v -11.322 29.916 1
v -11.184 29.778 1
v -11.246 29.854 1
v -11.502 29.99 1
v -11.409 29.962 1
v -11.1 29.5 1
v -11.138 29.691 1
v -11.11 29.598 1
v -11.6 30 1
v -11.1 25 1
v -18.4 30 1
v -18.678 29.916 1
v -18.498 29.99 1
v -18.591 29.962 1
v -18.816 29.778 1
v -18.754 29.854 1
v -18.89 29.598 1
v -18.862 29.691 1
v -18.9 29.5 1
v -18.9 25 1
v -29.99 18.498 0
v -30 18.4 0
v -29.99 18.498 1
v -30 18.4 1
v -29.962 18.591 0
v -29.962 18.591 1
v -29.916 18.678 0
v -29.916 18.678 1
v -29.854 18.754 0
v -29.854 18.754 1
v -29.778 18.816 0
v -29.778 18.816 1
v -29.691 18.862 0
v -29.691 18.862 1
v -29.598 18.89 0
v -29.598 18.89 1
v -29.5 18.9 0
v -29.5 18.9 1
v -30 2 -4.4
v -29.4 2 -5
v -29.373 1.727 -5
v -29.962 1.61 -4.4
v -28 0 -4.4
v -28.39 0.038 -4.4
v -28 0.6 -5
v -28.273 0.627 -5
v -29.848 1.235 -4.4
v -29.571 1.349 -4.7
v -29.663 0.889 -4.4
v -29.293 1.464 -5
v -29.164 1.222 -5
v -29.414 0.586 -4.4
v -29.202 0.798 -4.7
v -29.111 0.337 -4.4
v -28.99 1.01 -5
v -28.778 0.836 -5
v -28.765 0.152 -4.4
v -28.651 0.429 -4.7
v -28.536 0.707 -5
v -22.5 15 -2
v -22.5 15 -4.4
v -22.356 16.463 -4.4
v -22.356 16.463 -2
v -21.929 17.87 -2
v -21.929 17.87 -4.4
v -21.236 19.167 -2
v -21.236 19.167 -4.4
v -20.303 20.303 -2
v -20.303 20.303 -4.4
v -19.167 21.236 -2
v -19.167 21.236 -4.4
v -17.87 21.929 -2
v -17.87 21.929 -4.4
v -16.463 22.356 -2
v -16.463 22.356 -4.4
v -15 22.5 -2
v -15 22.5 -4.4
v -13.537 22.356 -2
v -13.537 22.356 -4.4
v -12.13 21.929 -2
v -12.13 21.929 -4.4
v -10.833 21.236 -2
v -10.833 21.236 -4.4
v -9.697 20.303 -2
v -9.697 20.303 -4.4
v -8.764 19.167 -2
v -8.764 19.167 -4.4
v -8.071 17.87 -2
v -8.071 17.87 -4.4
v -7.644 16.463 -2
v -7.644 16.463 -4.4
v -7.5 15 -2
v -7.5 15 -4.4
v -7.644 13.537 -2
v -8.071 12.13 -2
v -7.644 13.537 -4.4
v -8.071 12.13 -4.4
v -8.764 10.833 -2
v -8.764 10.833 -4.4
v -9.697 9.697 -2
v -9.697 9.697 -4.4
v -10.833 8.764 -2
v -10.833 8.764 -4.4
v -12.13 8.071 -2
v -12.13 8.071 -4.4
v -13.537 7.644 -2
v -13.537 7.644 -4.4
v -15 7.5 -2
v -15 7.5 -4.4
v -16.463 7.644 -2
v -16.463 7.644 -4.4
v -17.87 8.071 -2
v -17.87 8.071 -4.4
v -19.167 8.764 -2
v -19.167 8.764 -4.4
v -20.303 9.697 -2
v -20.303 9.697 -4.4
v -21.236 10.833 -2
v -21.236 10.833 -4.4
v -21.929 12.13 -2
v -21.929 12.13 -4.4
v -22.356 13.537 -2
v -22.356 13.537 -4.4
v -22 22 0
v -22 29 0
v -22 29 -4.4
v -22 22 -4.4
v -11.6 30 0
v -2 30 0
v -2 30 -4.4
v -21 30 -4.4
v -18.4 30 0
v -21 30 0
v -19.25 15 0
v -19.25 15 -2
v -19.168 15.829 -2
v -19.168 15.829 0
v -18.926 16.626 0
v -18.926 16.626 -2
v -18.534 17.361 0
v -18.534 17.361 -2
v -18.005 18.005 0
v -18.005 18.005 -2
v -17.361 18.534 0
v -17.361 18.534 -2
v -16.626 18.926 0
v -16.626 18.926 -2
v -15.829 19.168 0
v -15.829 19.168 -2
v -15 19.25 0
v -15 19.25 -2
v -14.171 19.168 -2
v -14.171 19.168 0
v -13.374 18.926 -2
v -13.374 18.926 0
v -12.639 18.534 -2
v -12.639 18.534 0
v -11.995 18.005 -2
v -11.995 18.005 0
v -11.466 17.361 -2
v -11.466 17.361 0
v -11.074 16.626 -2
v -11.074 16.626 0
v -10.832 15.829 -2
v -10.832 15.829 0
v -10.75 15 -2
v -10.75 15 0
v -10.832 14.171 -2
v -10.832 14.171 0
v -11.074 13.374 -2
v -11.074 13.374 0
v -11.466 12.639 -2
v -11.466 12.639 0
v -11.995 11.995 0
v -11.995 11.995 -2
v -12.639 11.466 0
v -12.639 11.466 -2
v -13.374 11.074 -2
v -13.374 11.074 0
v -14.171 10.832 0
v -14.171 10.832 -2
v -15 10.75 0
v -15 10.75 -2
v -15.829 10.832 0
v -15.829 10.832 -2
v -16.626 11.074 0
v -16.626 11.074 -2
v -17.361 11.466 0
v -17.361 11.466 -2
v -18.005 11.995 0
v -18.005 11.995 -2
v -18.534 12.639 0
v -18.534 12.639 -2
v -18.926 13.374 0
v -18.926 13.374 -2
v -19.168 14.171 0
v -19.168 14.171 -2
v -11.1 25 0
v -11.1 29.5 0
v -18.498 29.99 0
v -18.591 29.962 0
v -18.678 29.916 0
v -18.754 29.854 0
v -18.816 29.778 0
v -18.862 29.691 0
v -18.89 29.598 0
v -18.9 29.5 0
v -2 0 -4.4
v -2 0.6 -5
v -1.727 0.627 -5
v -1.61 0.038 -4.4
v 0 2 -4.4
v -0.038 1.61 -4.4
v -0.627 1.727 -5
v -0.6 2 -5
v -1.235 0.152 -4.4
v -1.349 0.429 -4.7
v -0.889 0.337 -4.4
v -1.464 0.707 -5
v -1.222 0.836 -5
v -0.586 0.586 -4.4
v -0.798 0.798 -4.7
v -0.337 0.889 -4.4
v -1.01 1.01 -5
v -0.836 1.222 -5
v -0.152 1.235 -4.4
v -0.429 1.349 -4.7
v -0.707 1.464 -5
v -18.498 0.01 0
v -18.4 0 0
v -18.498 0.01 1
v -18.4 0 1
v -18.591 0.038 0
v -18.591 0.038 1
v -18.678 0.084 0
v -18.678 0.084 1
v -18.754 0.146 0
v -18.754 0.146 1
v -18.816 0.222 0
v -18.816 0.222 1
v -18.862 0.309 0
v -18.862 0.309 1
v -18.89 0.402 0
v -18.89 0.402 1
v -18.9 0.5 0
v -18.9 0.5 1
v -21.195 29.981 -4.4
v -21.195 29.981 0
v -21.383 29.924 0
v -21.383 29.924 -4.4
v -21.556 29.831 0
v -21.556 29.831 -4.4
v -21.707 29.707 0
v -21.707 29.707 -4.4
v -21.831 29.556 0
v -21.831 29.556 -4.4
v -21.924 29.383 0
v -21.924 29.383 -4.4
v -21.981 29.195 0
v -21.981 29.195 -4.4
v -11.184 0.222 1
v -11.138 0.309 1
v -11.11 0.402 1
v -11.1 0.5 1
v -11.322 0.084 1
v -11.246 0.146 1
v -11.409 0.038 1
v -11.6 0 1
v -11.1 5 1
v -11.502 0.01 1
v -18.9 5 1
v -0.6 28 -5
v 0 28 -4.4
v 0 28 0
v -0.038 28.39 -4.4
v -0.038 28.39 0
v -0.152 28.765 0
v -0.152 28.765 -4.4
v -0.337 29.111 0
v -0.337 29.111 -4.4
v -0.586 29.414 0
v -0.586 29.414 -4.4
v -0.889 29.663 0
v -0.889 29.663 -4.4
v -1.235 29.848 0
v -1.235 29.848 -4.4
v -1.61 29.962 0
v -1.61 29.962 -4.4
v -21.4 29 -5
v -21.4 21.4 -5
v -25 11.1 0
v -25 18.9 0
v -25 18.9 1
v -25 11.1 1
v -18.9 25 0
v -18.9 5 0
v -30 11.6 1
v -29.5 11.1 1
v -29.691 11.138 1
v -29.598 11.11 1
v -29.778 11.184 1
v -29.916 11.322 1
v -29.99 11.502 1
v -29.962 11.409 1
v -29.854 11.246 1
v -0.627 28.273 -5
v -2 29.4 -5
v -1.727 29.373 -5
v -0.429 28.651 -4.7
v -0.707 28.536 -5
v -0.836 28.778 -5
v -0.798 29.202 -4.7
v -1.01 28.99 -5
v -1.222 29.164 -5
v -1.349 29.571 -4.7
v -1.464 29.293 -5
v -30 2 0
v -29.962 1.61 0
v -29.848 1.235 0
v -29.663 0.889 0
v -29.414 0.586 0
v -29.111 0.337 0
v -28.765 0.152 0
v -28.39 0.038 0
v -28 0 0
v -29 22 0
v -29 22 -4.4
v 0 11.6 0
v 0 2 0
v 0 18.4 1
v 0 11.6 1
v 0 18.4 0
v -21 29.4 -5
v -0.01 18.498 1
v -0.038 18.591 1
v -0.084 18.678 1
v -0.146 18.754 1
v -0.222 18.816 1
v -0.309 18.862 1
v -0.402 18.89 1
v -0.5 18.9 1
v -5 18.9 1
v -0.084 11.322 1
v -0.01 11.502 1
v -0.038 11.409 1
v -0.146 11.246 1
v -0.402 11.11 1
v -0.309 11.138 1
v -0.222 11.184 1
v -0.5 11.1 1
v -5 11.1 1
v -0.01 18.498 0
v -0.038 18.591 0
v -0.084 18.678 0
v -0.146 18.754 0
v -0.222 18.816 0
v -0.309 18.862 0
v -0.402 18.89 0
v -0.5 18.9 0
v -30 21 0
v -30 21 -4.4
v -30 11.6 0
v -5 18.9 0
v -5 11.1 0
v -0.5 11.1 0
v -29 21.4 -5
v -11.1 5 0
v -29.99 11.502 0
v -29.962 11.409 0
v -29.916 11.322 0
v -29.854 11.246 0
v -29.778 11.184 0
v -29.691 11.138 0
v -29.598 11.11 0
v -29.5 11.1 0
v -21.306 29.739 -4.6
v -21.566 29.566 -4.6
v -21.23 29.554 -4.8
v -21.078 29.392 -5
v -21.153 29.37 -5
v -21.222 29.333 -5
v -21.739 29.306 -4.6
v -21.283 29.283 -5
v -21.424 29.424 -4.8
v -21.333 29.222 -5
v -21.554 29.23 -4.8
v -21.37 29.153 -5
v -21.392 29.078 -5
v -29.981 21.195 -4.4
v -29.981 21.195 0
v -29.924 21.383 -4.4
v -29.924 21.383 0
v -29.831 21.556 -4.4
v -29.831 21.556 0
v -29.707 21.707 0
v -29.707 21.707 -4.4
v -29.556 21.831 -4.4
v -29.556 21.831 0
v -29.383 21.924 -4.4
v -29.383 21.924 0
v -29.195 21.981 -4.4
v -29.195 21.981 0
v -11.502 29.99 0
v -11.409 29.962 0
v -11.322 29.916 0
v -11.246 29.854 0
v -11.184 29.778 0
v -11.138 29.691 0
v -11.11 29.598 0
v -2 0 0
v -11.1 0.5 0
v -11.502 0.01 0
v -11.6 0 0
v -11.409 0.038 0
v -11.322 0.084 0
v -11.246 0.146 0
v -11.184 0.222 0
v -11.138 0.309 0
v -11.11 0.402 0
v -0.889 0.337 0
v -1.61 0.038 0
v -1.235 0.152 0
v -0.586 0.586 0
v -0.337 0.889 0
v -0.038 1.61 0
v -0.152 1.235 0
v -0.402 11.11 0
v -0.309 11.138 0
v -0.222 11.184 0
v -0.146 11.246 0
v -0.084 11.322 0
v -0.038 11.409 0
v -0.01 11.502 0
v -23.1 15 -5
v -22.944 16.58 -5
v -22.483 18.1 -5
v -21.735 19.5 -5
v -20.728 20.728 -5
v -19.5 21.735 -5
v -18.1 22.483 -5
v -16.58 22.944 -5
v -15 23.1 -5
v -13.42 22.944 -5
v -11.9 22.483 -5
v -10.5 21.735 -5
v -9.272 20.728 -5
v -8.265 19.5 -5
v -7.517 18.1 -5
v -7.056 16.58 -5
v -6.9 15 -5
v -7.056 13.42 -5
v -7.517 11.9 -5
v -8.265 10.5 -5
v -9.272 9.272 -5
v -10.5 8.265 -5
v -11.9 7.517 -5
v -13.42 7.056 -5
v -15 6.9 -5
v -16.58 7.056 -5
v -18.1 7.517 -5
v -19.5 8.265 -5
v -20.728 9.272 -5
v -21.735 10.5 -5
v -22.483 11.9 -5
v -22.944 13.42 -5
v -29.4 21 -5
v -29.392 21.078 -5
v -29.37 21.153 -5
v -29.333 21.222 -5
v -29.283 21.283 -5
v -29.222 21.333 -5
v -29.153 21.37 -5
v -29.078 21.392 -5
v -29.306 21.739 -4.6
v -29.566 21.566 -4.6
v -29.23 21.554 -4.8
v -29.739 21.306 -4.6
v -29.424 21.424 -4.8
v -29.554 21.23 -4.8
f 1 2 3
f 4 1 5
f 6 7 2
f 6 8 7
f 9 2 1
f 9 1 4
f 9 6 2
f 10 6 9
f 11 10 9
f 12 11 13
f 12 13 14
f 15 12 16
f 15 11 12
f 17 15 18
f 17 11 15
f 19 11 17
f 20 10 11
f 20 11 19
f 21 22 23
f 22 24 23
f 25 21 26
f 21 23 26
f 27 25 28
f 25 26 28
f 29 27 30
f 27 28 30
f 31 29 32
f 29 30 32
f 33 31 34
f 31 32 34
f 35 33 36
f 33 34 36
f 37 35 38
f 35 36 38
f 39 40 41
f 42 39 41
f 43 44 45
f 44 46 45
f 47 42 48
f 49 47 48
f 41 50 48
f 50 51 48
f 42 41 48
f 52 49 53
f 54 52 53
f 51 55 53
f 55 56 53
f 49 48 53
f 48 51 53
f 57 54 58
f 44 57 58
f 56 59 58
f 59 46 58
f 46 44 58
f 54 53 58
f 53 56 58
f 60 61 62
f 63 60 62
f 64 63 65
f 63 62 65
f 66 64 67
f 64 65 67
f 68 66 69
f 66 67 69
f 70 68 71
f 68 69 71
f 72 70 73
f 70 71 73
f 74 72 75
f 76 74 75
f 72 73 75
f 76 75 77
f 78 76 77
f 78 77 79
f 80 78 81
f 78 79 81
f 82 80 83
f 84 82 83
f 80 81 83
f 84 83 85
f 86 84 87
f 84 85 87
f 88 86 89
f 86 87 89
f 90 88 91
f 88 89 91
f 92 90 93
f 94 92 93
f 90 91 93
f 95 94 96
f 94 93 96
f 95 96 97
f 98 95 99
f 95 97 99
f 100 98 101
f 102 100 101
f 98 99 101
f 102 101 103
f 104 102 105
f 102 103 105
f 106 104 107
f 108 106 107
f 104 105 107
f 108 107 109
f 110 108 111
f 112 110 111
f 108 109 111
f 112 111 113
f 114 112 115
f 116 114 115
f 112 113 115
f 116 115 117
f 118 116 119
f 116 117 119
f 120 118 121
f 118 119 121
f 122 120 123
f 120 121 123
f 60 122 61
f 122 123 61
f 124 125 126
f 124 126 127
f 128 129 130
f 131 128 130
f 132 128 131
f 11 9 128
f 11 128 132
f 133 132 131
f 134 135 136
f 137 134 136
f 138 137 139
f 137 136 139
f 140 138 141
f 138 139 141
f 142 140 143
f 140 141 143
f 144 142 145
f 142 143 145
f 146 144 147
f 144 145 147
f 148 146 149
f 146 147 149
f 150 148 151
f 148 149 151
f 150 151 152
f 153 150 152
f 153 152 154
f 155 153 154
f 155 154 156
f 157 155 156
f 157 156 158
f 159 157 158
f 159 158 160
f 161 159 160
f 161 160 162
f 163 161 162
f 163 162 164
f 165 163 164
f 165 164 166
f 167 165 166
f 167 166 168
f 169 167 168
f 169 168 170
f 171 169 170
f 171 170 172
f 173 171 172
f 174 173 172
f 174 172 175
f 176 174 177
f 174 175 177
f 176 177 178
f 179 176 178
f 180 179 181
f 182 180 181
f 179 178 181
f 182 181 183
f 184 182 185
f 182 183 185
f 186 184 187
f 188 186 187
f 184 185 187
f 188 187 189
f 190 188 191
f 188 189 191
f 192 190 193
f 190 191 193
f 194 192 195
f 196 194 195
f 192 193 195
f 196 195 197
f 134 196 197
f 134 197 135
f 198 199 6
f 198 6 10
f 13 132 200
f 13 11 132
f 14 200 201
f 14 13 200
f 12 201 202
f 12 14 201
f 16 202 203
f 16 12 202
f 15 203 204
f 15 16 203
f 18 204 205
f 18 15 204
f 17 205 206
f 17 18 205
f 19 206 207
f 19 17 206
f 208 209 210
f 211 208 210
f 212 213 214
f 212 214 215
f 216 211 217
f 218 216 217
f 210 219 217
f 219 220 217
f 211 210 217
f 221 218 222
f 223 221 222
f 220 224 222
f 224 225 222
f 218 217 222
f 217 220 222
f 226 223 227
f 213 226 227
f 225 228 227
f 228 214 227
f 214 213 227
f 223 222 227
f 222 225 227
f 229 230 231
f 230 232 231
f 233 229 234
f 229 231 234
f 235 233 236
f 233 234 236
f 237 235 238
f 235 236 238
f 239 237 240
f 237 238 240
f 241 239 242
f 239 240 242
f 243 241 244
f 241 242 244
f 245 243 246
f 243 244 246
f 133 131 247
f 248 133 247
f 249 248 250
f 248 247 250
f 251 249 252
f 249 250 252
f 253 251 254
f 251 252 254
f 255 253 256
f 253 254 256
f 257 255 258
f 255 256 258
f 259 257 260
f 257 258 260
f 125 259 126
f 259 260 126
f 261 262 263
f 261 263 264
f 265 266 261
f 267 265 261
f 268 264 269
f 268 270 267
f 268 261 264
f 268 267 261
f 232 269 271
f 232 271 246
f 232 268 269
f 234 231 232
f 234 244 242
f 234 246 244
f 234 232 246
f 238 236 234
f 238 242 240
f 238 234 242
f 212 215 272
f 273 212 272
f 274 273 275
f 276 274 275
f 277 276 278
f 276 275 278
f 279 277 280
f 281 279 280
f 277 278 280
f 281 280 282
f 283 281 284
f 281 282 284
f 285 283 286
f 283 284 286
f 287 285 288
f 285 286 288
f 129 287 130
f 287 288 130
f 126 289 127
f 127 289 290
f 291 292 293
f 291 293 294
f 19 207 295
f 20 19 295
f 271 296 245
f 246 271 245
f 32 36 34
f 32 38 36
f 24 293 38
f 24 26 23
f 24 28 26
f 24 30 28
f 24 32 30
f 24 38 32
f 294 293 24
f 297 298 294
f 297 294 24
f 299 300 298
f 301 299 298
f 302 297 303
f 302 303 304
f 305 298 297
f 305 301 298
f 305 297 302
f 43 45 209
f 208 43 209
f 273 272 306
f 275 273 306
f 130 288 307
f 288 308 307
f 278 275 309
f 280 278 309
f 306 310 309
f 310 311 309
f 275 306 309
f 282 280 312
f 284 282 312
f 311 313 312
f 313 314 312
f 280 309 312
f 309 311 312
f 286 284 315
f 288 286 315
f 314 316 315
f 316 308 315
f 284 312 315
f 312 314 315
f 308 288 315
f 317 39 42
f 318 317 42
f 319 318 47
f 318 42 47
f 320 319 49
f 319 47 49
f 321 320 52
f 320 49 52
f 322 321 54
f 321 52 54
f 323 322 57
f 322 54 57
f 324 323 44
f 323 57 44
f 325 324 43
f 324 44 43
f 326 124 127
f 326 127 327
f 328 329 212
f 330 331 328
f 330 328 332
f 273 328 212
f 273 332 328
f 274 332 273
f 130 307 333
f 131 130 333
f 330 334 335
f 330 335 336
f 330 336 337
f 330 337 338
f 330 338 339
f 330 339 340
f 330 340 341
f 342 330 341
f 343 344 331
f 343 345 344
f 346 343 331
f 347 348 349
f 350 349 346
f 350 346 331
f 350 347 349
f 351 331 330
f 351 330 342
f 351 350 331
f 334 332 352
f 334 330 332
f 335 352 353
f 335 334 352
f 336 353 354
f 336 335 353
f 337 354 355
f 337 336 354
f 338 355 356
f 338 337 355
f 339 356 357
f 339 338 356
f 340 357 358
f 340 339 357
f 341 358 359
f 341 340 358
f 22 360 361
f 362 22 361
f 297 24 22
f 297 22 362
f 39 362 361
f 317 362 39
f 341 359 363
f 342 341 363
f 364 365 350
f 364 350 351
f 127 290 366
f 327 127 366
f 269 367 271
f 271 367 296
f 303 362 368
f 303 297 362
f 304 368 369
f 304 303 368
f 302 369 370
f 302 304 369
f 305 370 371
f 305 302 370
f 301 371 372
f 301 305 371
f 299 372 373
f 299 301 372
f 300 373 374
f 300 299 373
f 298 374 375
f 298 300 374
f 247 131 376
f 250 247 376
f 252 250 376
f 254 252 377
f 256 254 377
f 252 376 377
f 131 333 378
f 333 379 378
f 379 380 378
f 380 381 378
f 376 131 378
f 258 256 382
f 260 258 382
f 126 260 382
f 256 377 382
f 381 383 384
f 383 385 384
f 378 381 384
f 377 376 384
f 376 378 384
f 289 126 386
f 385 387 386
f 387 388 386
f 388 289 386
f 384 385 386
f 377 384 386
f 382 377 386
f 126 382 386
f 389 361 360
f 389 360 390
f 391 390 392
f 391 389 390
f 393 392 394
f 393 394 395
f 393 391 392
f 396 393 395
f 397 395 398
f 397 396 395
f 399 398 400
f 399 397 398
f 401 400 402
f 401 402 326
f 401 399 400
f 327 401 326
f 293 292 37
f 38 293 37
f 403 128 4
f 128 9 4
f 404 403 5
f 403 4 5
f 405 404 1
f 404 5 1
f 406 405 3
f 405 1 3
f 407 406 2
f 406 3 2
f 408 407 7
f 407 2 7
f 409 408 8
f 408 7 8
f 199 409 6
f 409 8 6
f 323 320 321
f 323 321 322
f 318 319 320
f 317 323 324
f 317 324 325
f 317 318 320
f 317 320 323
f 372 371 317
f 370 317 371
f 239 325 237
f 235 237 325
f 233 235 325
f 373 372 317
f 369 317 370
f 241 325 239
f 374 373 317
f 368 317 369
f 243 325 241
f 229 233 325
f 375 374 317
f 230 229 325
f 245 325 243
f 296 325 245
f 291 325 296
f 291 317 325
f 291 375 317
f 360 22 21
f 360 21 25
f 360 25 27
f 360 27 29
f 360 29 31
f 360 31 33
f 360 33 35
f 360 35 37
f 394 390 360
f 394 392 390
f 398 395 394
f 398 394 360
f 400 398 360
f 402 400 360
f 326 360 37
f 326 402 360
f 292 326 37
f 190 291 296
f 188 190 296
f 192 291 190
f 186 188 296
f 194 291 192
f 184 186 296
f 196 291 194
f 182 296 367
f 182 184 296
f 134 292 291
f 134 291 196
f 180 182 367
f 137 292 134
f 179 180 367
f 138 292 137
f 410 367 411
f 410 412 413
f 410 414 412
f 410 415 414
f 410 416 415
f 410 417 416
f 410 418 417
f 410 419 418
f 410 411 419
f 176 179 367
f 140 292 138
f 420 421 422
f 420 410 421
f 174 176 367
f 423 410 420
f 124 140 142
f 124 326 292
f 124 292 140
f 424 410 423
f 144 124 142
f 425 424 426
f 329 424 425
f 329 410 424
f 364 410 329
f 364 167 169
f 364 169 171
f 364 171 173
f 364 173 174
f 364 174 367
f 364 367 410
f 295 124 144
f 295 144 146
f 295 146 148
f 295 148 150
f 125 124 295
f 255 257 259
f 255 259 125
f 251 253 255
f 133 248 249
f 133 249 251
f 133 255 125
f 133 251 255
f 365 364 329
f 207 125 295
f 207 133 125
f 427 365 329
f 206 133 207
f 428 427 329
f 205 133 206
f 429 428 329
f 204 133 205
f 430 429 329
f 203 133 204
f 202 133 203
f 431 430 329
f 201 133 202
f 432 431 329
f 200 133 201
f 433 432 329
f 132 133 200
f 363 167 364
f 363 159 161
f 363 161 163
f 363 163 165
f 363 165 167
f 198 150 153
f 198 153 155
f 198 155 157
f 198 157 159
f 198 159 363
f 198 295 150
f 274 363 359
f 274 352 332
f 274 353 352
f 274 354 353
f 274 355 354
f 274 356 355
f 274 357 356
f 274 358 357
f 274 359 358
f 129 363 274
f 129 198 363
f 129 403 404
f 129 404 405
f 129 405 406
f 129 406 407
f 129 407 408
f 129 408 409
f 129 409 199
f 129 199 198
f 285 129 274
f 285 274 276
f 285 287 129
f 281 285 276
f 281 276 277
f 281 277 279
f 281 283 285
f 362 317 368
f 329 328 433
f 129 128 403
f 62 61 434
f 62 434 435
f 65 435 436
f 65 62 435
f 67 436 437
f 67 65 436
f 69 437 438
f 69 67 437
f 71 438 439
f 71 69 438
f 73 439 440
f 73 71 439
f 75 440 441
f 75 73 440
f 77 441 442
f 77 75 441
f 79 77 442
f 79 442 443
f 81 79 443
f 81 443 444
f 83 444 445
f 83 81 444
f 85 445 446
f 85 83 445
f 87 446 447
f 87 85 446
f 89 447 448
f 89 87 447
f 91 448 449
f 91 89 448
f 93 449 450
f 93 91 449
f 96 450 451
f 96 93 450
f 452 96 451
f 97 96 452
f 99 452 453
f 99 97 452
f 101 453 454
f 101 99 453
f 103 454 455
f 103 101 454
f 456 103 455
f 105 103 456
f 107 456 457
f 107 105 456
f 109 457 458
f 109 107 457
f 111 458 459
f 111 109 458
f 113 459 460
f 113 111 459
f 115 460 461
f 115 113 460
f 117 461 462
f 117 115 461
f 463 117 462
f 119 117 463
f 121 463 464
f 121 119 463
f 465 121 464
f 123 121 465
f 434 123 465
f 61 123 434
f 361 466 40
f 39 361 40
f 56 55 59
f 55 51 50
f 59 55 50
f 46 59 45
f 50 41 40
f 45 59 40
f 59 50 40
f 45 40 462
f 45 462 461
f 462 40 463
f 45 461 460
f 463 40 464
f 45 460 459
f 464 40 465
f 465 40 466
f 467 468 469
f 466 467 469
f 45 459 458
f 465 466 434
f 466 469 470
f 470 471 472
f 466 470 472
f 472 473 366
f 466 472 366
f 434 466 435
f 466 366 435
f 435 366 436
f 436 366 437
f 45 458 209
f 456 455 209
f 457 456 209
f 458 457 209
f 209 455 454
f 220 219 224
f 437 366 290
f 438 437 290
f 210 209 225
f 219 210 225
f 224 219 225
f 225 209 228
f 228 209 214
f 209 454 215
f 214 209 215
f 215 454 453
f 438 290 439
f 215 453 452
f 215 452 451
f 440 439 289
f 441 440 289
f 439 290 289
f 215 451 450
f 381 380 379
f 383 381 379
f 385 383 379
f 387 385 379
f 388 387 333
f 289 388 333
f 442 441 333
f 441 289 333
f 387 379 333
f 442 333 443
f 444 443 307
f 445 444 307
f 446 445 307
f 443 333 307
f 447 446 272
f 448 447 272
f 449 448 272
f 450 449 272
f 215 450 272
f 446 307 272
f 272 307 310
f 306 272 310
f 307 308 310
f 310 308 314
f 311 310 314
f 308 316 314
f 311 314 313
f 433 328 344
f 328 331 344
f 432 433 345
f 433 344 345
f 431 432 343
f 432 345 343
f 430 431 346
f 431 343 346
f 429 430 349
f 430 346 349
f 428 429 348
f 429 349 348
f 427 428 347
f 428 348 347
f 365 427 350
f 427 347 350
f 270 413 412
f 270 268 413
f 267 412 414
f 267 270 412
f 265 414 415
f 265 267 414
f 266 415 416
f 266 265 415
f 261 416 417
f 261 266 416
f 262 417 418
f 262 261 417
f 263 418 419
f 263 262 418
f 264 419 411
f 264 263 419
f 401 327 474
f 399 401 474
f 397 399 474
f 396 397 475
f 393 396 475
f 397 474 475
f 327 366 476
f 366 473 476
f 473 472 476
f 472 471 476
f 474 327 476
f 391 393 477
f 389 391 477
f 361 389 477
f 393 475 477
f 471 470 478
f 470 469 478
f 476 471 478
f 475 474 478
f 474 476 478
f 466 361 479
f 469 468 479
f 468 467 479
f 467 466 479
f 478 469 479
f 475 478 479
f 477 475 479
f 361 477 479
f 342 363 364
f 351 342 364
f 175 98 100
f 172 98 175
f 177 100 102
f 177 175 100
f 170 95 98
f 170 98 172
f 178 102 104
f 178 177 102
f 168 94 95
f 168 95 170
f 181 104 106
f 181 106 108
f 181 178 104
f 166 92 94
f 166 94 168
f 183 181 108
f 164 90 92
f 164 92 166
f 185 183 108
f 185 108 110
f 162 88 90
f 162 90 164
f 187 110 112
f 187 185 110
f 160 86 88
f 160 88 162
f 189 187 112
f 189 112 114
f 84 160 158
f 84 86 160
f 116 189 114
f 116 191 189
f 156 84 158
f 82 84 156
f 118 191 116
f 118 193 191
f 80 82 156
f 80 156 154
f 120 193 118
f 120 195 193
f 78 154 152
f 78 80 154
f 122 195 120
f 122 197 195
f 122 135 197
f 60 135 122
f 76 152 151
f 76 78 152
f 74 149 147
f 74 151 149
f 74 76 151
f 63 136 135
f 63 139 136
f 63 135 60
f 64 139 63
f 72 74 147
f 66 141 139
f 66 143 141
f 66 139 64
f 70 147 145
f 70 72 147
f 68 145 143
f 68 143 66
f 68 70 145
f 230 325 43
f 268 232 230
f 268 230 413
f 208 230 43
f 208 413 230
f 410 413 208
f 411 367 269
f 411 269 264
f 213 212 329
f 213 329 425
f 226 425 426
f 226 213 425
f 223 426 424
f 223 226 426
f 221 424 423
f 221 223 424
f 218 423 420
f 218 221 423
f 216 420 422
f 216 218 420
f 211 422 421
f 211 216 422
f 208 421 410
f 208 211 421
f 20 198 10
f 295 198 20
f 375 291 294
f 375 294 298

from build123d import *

# Parameters (mm, degrees)
PAD_DEPTH            = 5
SKETCH001_R          = 4.25
POCKET_DEPTH         = 5.001
SKETCH002_R          = 7.5
POCKET001_DEPTH      = 3
SKETCH003_W          = 7.8
SKETCH003_H          = 5
SKETCH003_W_2        = 5
SKETCH003_H_2        = 7.8
PAD001_DEPTH         = 1
FILLET_R             = 0.5
FILLET001_R          = 2
FILLET002_R          = 1
CHAMFER_SIZE         = 0.6
BODY_PLACEMENT_ANGLE = 180


with BuildPart() as part:
    # Sketch → Pad (new body)
    with BuildSketch(Plane.XY):
        Polygon((0, 0), (0, 30), (22, 30), (22, 22), (30, 22), (30, 0), align=None)
    extrude(amount=PAD_DEPTH)

    # Sketch001 (on Face8 of Pad) → Pocket (cut, through all)
    with BuildSketch(Plane.XY.offset(5)):
        with Locations((15, 15)):
            Circle(SKETCH001_R)
    extrude(amount=-POCKET_DEPTH, mode=Mode.SUBTRACT)

    # Sketch002 (on Face5 of Pocket) → Pocket001 (cut)
    with BuildSketch(Plane.XY.offset(5)):
        with Locations((15, 15)):
            Circle(SKETCH002_R)
    extrude(amount=-POCKET001_DEPTH, mode=Mode.SUBTRACT)

    # Sketch003 (on Face4 of Pocket001) → Pad001 (join)
    with BuildSketch(Plane(origin=(0, 0, 0), x_dir=(1, 0, 0), z_dir=(0, 0, -1))):
        with Locations((15, -2.5)):
            Rectangle(SKETCH003_W, SKETCH003_H)
        with Locations((15, -27.5)):
            Rectangle(SKETCH003_W, SKETCH003_H)
        with Locations((2.5, -15)):
            Rectangle(SKETCH003_W_2, SKETCH003_H_2)
        with Locations((27.5, -15)):
            Rectangle(SKETCH003_W_2, SKETCH003_H_2)
    extrude(amount=PAD001_DEPTH)

    # Fillet
    fillet_edges = [part.edges().sort_by_distance(p)[0] for p in [
        (18.9, 0, -0.5),
        (11.1, 0, -0.5),
        (0, 11.1, -0.5),
        (0, 18.9, -0.5),
        (11.1, 30, -0.5),
        (18.9, 30, -0.5),
        (30, 18.9, -0.5),
        (30, 11.1, -0.5),
    ]]
    fillet(fillet_edges, radius=FILLET_R)

    # Fillet001
    fillet001_edges = [part.edges().sort_by_distance(p)[0] for p in [
        (0, 30, 2.5),
        (0, 0, 2.5),
        (30, 0, 2.5),
    ]]
    fillet(fillet001_edges, radius=FILLET001_R)

    # Fillet002
    fillet002_edges = [part.edges().sort_by_distance(p)[0] for p in [
        (22, 30, 2.5),
        (30, 22, 2.5),
    ]]
    fillet(fillet002_edges, radius=FILLET002_R)

    # Chamfer
    chamfer_edges = [part.edges().sort_by_distance(p)[0] for p in [
        (11.5, 30, 5),
        (21.707107, 29.707107, 5),
        (0.585786, 29.414214, 5),
        (22, 25.5, 5),
        (0, 15, 5),
        (25.5, 22, 5),
        (0.585786, 0.585786, 5),
        (29.707107, 21.707107, 5),
        (15, 0, 5),
        (30, 11.5, 5),
        (29.414214, 0.585786, 5),
        (7.5, 15, 5),
    ]]
    chamfer(chamfer_edges, length=CHAMFER_SIZE)


with BuildPart() as part_1:
    # Body placement: moved
    add(part.part.rotate(Axis((0, 0, 0), (0, 1, 0)), BODY_PLACEMENT_ANGLE))


solid = part_1.part
